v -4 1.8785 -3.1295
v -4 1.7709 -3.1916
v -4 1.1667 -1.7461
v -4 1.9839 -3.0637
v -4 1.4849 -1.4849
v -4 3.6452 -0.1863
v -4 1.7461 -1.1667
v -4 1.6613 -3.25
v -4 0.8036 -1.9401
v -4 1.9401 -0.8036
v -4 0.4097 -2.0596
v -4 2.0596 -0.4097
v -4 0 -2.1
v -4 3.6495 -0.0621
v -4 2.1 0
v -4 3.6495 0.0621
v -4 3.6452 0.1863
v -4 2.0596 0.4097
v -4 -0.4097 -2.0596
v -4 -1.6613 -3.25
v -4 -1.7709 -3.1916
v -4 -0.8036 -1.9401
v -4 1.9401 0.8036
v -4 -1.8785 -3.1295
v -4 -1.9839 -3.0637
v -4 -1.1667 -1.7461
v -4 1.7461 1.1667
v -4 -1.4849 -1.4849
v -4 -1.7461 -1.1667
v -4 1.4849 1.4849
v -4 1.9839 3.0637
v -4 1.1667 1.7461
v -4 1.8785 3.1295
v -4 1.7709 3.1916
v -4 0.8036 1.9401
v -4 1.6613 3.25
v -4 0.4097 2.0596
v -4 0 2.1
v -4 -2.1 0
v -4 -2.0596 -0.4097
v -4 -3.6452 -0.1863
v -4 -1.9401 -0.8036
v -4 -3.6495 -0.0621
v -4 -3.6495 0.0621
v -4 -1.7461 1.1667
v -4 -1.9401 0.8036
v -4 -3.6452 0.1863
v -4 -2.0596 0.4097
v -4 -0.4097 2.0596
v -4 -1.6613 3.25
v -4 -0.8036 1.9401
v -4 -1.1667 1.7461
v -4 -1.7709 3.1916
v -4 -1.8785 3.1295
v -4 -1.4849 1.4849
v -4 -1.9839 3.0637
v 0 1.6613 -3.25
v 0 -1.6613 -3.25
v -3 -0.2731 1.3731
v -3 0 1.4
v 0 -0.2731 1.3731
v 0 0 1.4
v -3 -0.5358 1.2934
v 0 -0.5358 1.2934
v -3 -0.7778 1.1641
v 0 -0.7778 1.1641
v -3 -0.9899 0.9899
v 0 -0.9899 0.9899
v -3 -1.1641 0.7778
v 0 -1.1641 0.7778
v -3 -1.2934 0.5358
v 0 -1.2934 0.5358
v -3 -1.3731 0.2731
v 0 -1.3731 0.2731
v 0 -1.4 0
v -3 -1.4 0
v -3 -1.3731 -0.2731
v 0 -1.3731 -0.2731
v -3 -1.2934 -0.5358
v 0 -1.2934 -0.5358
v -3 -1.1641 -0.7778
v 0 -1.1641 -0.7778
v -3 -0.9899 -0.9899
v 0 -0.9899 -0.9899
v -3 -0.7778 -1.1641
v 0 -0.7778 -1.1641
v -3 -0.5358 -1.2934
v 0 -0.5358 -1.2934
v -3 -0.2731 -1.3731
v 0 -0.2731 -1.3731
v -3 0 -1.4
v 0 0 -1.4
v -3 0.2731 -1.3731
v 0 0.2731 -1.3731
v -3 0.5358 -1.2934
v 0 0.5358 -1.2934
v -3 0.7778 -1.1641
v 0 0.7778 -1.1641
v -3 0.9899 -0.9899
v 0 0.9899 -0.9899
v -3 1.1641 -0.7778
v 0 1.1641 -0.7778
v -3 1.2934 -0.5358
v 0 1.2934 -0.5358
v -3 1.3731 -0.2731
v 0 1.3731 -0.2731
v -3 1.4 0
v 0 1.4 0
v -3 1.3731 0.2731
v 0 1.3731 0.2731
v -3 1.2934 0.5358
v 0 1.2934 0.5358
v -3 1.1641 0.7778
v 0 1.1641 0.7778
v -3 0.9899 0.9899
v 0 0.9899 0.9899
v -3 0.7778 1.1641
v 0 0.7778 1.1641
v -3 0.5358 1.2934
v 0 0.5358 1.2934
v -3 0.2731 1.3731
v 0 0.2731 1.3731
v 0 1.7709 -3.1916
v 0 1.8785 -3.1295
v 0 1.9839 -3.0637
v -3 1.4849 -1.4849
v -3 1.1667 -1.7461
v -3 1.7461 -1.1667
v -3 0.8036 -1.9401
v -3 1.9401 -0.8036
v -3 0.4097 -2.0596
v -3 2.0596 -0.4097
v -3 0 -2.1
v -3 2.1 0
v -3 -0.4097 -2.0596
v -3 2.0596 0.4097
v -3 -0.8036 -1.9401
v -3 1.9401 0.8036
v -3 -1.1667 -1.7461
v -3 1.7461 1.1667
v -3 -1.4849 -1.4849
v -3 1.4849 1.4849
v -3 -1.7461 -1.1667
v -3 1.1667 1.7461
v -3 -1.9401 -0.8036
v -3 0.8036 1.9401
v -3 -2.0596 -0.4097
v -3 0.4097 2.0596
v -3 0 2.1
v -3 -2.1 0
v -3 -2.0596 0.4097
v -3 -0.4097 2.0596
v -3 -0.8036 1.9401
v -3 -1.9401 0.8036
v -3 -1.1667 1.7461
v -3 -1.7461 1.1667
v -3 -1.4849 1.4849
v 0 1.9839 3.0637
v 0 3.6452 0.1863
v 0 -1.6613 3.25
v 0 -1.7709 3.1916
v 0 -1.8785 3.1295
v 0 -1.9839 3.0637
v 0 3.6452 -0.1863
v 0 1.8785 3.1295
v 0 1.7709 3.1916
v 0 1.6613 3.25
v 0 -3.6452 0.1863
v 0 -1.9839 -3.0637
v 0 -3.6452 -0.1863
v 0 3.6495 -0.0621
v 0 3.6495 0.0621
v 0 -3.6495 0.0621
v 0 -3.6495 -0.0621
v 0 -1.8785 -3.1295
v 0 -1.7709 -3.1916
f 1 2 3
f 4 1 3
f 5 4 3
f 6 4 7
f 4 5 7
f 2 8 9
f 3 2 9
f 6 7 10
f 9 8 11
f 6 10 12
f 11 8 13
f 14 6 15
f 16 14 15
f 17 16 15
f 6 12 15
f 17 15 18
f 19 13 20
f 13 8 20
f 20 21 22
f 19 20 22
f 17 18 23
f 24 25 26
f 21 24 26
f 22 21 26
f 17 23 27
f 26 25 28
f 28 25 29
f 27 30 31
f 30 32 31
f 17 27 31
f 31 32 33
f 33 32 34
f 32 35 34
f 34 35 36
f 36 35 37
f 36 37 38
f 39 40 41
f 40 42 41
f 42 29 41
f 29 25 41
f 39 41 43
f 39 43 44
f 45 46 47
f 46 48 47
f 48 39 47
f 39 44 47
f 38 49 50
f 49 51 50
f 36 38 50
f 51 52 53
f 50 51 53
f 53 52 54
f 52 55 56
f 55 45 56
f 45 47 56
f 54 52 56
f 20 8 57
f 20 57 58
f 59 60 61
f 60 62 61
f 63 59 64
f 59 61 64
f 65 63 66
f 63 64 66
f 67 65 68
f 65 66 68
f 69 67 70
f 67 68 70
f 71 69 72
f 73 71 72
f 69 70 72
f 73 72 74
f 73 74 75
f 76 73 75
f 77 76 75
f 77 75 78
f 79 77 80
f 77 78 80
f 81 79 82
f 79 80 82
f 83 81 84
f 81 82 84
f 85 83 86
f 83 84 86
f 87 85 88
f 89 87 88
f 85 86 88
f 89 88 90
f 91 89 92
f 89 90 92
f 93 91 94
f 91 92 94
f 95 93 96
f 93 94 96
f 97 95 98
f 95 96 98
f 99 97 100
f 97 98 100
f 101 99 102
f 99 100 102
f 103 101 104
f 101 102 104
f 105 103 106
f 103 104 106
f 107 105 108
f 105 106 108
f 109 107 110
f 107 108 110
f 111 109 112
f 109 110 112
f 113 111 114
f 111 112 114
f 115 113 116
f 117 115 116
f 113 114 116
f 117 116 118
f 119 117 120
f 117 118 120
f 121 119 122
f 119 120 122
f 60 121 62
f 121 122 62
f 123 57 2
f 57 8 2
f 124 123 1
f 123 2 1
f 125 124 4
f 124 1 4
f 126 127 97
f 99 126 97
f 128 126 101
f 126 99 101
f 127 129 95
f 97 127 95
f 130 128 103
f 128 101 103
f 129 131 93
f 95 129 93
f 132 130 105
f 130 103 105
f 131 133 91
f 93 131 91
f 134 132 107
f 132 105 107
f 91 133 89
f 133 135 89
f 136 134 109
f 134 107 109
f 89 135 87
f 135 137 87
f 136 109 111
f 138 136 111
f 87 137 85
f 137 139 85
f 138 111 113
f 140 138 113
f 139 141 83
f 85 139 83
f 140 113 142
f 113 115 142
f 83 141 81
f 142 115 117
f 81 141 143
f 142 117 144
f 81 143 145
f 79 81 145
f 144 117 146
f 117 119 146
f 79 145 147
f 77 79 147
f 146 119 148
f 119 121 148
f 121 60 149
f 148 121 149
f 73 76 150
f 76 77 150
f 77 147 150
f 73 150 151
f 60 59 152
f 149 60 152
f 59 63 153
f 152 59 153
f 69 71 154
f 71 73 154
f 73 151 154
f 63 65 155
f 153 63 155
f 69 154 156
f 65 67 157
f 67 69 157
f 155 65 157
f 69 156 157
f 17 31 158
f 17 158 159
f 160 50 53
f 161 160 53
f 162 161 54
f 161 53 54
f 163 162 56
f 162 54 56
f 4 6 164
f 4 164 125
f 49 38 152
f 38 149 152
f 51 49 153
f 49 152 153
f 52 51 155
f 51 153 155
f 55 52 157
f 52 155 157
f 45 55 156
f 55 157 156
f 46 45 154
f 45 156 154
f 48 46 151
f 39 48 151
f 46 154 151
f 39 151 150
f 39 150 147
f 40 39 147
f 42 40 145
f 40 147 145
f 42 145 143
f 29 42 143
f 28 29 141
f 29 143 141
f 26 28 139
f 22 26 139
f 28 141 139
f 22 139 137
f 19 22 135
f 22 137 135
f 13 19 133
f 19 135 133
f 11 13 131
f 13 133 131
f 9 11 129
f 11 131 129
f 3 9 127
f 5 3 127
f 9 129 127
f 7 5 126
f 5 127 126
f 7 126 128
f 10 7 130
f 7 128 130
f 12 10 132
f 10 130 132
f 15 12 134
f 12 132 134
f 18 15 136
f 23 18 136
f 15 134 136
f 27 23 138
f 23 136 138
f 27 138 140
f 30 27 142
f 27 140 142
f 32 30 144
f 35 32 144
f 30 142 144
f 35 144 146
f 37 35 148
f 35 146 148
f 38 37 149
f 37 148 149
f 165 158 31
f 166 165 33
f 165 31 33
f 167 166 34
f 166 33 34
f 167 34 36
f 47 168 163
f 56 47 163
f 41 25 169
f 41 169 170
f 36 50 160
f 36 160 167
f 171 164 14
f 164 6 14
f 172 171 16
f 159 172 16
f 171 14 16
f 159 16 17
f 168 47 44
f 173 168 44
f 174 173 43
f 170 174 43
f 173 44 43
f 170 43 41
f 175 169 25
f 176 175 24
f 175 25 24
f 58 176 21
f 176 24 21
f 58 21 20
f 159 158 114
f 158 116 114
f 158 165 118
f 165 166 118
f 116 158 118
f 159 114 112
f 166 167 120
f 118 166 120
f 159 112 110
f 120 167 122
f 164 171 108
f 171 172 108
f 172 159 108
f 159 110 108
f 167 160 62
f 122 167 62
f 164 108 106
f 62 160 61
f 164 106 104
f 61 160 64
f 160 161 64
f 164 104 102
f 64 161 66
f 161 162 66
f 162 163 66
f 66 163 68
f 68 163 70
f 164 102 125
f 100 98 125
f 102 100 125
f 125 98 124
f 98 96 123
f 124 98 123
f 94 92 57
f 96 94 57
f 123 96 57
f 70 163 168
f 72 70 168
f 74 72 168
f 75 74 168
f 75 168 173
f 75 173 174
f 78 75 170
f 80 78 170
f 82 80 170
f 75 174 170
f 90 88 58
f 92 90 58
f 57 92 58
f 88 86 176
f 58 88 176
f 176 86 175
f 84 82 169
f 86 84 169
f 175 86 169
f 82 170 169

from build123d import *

# Parameters (mm, degrees)
SKETCH_2_OUTSIDE_W  = 11.514
SKETCH_2_OUTSIDE_H  = 11.514
CUT_EXTRUDE_1_DEPTH = 10


with BuildPart() as part:
    # 草图1 → 旋转1 (revolve)
    with BuildSketch(Plane.XY, mode=Mode.PRIVATE) as revolve_1_sk:
        Polygon((0, 1.4), (0, 3.65), (-4, 3.65), (-4, 2.1), (-3, 2.1), (-3, 1.4), align=None)
    revolve(revolve_1_sk.sketch.rotate(Axis((-9.405405405, 0, 0), (1, 0, 0)), 90), axis=Axis((-9.405405405, 0, 0), (1, 0, 0)))

    # 草图2 outside → 切除-拉伸1 (cut)
    with BuildSketch(Plane.ZY.offset(4)):
        Rectangle(SKETCH_2_OUTSIDE_W, SKETCH_2_OUTSIDE_H)
        Polygon((0, 3.75277675), (-3.25, 1.876388375), (-3.25, -1.876388375), (0, -3.75277675), (3.25, -1.876388375), (3.25, 1.876388375), align=None, mode=Mode.SUBTRACT)
    extrude(amount=-CUT_EXTRUDE_1_DEPTH, mode=Mode.SUBTRACT)


solid = part.part
